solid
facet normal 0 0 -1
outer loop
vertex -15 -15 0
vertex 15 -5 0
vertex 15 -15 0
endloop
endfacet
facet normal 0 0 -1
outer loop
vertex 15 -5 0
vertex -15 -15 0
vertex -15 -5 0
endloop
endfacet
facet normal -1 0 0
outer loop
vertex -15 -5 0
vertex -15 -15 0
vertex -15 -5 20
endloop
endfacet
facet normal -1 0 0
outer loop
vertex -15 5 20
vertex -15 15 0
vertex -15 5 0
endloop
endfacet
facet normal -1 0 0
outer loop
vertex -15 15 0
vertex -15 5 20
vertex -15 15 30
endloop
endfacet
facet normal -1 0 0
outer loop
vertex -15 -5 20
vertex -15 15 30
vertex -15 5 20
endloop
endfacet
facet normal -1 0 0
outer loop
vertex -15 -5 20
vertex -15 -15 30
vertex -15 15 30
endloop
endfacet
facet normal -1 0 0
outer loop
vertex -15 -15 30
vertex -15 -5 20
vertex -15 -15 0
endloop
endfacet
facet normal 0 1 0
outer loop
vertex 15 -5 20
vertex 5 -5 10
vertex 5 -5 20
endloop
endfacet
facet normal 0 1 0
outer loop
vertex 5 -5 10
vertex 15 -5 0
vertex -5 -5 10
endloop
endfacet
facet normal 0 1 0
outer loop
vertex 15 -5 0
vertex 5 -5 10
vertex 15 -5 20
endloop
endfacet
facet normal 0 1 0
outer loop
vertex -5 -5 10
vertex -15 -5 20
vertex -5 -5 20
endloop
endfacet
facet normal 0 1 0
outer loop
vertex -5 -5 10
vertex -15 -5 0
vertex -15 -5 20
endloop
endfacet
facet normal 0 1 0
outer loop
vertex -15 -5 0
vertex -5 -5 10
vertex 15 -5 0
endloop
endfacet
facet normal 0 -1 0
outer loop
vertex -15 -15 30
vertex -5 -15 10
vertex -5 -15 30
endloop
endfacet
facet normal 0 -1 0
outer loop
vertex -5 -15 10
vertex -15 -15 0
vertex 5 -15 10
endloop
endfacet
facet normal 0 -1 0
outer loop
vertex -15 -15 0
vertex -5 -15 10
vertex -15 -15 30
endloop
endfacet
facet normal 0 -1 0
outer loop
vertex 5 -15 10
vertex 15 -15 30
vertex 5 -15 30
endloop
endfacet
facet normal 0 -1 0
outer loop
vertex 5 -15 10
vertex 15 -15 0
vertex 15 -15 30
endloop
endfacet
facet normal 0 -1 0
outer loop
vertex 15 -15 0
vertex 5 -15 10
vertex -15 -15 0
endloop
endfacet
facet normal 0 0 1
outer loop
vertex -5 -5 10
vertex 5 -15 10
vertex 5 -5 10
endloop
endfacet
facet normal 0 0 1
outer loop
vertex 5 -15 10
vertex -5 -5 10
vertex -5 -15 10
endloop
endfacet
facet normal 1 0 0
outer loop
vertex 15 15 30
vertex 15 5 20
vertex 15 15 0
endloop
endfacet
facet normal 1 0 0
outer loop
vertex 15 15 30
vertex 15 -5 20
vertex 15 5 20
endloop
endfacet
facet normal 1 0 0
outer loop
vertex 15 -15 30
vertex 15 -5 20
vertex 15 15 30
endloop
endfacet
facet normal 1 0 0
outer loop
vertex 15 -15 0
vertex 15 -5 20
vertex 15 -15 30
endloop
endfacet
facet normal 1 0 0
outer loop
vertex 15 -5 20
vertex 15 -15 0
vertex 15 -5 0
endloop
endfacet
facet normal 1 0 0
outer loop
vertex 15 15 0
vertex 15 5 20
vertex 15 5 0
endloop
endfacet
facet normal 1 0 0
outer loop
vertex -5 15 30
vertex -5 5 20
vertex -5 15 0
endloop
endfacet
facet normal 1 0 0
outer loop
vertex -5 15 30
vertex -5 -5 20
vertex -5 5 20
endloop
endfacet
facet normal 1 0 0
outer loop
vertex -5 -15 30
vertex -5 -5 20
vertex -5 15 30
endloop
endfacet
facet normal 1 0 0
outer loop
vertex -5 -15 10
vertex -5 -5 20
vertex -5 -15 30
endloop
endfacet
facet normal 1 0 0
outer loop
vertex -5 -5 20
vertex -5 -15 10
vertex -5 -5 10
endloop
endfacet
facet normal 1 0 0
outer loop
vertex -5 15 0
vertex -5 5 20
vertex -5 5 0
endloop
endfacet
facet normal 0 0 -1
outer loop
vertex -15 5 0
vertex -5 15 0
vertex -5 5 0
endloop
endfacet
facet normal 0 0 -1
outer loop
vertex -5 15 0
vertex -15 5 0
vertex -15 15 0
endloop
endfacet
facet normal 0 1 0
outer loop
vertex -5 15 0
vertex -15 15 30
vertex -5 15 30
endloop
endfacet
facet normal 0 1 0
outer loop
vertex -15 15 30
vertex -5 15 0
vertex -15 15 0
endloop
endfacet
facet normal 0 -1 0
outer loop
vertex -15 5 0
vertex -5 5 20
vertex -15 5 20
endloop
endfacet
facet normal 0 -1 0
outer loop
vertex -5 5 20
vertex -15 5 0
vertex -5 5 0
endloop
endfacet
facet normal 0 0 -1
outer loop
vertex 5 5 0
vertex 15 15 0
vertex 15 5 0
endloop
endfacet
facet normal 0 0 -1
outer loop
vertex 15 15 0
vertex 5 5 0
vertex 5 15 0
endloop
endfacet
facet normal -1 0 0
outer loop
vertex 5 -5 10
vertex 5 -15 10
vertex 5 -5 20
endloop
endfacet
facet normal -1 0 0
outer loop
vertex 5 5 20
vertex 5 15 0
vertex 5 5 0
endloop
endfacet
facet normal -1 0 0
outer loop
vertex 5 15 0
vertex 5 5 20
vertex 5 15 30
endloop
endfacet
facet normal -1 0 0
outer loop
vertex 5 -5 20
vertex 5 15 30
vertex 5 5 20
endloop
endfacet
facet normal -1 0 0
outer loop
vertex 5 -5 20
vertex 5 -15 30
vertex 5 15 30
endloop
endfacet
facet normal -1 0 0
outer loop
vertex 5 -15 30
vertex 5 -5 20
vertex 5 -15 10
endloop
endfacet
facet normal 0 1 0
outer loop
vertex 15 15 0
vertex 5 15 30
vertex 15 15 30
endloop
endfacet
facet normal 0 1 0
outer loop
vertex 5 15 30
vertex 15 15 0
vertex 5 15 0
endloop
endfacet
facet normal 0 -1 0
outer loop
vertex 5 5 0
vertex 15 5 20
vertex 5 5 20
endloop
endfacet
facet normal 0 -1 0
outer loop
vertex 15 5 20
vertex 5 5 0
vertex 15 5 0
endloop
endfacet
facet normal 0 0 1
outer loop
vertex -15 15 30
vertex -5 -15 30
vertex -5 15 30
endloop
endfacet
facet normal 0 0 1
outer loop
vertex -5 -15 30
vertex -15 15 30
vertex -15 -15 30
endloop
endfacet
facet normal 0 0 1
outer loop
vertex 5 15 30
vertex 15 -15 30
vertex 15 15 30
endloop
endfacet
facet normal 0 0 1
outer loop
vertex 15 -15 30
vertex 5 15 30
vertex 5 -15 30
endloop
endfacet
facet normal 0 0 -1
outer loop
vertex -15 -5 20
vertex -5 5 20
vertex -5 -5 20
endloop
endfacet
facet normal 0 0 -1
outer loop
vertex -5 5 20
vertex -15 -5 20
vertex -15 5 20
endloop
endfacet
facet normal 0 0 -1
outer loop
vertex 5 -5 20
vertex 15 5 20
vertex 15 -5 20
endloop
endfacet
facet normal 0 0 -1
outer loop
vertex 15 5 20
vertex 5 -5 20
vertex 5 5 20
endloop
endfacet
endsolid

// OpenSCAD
// IDEX test cube, modelled by the FAST research group for testing IDEX printers.
// A 3 x 3 x 3 grid of cubic cells with a set of channels cut through it.
// SPDX-License-Identifier: MIT
//
// Origin: centred on X and Y, sitting on Z = 0.

/* [Size] */
// Edge length of one grid cell
cell = 10;

/* [Hidden] */
// Solid cells, indexed [layer z][row y][column x], from -X/-Y/bottom upward.
// 1 = solid, 0 = channel.
cells = [
    [ // bottom layer
        [1, 1, 1],
        [0, 0, 0],
        [1, 0, 1],
    ],
    [ // middle layer
        [1, 0, 1],
        [0, 0, 0],
        [1, 0, 1],
    ],
    [ // top layer
        [1, 0, 1],
        [1, 0, 1],
        [1, 0, 1],
    ],
];
n = len(cells[0][0]); // cells per side

module idex_test_cube() {
    translate([-n * cell / 2, -n * cell / 2, 0])
        union()
            for (z = [0 : len(cells) - 1], y = [0 : n - 1], x = [0 : n - 1])
                if (cells[z][y][x] == 1)
                    translate([x, y, z] * cell) cube(cell);
}

idex_test_cube();
